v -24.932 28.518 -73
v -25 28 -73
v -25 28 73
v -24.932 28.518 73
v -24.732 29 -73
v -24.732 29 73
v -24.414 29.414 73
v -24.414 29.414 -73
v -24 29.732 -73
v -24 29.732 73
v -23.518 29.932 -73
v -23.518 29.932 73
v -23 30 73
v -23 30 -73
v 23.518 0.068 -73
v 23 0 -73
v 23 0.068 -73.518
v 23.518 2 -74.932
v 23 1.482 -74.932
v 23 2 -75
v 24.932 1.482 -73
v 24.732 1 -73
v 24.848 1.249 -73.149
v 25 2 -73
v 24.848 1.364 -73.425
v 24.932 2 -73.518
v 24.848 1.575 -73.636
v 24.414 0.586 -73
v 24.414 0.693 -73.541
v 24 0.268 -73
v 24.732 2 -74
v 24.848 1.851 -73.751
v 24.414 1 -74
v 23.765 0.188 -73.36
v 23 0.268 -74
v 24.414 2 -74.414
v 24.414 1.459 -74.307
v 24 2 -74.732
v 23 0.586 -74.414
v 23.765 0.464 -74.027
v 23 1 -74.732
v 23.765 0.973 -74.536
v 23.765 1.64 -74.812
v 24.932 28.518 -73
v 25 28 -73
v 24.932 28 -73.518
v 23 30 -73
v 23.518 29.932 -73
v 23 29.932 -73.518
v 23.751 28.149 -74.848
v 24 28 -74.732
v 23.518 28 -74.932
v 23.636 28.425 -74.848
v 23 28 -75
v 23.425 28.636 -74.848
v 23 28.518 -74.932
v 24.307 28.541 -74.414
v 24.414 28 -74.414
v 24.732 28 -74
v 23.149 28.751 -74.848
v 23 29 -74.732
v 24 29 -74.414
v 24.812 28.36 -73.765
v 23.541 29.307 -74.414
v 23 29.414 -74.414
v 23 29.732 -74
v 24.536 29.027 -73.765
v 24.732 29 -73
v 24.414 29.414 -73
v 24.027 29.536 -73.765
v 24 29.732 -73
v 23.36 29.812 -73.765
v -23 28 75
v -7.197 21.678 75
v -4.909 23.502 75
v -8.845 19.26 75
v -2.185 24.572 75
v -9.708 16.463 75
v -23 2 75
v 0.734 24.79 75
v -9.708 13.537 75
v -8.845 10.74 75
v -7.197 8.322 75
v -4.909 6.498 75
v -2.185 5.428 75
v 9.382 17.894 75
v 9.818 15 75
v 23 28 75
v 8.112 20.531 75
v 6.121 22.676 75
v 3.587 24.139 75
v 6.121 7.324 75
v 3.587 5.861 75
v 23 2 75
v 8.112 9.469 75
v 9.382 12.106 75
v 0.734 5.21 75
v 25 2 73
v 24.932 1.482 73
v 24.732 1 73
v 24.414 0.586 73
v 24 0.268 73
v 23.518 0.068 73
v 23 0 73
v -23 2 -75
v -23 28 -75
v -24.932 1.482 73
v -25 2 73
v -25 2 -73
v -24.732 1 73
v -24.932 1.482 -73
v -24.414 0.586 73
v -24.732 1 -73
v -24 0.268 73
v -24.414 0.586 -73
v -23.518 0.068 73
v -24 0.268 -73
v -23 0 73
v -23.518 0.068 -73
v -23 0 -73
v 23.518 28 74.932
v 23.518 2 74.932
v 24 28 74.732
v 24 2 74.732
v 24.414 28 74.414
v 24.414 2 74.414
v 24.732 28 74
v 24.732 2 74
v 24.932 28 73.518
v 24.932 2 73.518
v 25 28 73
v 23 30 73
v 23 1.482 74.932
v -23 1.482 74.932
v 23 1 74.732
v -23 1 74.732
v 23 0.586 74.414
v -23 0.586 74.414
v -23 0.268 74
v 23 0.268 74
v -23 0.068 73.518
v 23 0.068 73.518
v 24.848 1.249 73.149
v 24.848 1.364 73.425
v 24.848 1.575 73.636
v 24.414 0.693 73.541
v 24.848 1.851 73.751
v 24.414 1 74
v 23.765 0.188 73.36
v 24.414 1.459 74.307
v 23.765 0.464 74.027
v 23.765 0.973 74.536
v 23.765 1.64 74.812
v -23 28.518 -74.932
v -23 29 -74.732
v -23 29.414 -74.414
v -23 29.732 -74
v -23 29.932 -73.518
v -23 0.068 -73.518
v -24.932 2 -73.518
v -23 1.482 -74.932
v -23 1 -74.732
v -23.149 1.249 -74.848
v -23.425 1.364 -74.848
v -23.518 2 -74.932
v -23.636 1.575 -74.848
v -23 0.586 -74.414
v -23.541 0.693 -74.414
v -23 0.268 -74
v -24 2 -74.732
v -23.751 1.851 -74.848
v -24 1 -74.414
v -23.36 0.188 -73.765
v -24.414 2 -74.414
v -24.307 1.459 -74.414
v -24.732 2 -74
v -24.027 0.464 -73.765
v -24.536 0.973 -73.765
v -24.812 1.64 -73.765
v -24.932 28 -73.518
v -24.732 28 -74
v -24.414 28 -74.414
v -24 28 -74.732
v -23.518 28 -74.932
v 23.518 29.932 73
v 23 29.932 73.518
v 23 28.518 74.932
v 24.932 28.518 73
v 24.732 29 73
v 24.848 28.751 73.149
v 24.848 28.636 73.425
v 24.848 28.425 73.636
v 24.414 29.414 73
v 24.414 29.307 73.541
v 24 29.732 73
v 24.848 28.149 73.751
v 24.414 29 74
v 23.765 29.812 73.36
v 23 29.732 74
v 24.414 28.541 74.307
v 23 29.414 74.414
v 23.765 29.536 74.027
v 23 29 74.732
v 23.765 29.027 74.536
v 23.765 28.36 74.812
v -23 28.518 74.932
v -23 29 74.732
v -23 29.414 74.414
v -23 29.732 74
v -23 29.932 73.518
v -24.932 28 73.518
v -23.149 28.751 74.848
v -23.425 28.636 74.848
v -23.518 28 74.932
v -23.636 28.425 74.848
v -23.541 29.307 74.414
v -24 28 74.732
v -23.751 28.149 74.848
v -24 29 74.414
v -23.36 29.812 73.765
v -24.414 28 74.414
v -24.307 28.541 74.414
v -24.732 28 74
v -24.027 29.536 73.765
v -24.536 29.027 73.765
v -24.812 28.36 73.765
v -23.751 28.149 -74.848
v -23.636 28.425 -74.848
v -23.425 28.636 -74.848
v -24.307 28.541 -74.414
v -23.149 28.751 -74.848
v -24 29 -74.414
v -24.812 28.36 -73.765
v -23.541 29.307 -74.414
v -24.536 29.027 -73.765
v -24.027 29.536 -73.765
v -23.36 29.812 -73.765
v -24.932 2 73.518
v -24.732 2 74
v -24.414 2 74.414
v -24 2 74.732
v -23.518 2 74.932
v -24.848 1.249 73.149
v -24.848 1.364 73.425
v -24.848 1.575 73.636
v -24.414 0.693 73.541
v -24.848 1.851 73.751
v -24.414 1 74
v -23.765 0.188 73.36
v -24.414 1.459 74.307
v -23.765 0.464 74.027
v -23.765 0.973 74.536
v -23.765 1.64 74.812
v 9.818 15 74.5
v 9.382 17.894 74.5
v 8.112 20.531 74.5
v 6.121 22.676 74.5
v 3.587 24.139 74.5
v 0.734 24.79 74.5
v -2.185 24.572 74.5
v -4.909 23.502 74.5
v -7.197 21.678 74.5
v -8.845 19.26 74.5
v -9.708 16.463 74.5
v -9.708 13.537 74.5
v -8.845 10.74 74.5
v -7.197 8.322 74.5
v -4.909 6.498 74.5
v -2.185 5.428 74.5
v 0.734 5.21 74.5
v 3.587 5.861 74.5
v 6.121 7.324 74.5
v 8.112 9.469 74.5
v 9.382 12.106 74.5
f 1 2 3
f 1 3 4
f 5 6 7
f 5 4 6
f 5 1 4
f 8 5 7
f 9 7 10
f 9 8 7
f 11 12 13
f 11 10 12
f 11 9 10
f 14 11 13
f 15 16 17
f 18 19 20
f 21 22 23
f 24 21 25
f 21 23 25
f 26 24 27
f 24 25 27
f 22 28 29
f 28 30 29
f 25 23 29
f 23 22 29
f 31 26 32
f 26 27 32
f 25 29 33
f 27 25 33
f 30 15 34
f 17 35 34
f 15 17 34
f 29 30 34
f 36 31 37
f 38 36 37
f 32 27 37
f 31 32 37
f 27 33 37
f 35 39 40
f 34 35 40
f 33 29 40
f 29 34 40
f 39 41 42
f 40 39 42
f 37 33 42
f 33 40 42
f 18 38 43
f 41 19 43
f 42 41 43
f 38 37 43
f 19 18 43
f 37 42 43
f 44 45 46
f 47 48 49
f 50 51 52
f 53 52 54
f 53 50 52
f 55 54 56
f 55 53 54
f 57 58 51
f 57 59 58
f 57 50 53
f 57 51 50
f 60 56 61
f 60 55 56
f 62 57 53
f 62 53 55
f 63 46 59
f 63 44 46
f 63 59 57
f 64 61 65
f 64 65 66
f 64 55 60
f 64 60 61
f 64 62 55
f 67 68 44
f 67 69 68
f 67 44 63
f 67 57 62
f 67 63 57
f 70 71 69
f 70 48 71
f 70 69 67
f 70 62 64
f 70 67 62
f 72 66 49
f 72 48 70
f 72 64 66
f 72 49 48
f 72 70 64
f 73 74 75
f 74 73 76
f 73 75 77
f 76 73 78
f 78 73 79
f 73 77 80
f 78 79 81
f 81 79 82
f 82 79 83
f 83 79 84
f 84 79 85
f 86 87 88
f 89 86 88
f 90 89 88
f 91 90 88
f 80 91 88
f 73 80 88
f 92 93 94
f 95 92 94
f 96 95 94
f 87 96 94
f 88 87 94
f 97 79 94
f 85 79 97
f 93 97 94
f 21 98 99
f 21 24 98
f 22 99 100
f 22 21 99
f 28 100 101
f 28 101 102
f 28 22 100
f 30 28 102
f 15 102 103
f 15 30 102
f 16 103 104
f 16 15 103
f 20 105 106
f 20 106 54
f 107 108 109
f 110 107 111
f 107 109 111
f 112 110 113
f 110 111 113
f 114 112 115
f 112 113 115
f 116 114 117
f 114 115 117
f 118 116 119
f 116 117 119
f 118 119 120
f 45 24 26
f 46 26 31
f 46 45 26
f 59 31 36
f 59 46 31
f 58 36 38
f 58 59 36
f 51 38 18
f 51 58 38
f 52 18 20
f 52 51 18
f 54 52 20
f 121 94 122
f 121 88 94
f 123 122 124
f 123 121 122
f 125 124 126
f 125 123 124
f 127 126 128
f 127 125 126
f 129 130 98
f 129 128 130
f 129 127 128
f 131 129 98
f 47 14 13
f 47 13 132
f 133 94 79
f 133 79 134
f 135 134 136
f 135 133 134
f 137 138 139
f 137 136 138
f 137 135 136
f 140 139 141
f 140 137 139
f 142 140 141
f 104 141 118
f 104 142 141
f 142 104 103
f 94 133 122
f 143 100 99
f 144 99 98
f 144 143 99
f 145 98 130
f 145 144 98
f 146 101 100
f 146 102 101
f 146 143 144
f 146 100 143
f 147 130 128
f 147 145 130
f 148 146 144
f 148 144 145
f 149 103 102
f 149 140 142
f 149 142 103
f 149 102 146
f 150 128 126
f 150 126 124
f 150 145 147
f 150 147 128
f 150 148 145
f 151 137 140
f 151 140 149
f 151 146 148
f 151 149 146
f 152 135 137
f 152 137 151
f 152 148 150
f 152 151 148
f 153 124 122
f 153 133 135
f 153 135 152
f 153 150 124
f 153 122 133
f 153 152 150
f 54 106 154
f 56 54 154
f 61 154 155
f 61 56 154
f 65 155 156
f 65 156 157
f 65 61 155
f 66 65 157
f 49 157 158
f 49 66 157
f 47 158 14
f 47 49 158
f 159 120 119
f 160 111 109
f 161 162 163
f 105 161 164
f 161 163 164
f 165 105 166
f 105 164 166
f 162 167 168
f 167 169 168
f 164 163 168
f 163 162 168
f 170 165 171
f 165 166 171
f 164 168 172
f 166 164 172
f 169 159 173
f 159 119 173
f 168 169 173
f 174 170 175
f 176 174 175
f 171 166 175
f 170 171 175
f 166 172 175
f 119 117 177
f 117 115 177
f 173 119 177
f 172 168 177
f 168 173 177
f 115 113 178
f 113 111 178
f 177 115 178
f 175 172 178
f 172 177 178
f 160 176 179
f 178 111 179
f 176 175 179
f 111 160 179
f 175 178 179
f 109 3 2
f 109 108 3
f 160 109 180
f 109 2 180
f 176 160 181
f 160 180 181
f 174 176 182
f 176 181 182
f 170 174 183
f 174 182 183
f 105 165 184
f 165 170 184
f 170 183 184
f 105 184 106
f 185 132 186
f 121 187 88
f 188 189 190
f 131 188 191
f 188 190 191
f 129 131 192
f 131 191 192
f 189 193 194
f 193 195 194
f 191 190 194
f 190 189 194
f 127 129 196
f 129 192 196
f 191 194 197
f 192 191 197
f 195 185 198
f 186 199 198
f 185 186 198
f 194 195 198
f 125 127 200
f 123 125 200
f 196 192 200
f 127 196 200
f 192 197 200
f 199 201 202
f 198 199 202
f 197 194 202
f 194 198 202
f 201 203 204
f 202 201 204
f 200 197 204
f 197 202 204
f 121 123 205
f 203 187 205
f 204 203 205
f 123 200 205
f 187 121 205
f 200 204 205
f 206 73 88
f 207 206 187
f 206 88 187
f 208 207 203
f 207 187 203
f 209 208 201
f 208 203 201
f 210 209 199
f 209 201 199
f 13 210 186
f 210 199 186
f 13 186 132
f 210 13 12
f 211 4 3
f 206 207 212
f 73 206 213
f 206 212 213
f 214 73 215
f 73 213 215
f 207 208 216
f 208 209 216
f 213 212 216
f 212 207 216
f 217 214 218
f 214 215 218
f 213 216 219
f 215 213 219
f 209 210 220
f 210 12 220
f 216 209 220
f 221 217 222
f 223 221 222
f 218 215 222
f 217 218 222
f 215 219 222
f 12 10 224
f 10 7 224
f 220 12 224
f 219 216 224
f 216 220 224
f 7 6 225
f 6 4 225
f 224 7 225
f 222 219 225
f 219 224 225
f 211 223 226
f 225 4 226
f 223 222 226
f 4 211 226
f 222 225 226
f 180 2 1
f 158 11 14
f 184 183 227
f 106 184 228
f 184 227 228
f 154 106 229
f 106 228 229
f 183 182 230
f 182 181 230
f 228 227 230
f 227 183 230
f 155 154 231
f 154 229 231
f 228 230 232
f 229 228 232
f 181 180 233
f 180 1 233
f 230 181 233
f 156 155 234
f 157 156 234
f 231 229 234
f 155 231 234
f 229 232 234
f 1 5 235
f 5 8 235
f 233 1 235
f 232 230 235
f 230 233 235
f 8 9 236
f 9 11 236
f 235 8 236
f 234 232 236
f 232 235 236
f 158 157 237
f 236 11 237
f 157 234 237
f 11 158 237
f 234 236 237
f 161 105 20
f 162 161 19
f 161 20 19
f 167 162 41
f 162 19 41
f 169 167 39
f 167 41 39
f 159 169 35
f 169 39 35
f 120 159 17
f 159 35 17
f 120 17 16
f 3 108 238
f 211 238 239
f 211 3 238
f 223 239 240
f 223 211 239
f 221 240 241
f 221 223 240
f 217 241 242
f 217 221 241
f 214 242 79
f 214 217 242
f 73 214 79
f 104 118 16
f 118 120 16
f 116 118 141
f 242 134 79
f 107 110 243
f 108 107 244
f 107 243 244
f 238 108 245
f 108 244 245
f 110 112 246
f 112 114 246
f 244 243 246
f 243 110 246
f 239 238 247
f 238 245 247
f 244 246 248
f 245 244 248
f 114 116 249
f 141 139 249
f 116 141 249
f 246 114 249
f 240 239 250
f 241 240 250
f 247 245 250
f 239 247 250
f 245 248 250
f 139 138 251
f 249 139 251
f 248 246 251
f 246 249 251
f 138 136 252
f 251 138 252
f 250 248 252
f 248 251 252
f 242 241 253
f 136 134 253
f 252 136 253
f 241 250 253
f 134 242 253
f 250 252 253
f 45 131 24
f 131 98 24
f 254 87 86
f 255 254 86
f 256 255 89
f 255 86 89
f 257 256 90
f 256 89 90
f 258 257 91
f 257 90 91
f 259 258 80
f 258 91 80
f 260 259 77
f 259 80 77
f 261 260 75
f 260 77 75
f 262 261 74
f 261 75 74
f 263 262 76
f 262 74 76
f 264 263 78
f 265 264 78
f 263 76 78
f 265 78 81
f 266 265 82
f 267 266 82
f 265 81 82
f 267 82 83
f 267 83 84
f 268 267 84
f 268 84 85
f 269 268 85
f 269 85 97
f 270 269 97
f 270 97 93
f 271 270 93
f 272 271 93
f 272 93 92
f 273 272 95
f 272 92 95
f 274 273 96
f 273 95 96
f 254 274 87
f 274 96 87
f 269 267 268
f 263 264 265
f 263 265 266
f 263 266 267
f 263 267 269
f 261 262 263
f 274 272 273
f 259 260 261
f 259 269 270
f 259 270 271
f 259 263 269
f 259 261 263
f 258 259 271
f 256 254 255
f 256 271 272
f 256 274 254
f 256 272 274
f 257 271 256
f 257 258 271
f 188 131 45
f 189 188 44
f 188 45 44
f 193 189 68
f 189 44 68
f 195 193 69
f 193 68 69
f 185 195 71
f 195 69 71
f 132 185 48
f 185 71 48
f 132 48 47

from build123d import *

# Parameters (mm, degrees)
SKETCH2_W           = 50
SKETCH2_H           = 150
BOSS_EXTRUDE1_DEPTH = 30
FILLET1_R           = 2
SKETCH3_R           = 9.81775282
CUT_EXTRUDE1_DEPTH  = 0.5


with BuildPart() as part:
    # Sketch2 → Boss-Extrude1 (new body)
    with BuildSketch(Plane(origin=(0, 0, 0), x_dir=(1, 0, 0), z_dir=(0, 1, 0))):
        Rectangle(SKETCH2_W, SKETCH2_H)
    extrude(amount=BOSS_EXTRUDE1_DEPTH)

    # Fillet1
    fillet1_edges = [part.edges().sort_by_distance(p)[0] for p in [
        (-25, 30, 0),
        (0, 30, 75),
        (25, 30, 0),
        (0, 0, 75),
        (-25, 0, 0),
        (0, 0, -75),
        (25, 0, 0),
        (25, 15, 75),
        (-25, 15, 75),
        (-25, 15, -75),
        (25, 15, -75),
        (0, 30, -75),
    ]]
    fillet(fillet1_edges, radius=FILLET1_R)

    # Sketch3 → Cut-Extrude1 (cut)
    with BuildSketch(Plane.XY.offset(75)):
        with Locations((0, 15)):
            Circle(SKETCH3_R)
    extrude(amount=-CUT_EXTRUDE1_DEPTH, mode=Mode.SUBTRACT)


solid = part.part
